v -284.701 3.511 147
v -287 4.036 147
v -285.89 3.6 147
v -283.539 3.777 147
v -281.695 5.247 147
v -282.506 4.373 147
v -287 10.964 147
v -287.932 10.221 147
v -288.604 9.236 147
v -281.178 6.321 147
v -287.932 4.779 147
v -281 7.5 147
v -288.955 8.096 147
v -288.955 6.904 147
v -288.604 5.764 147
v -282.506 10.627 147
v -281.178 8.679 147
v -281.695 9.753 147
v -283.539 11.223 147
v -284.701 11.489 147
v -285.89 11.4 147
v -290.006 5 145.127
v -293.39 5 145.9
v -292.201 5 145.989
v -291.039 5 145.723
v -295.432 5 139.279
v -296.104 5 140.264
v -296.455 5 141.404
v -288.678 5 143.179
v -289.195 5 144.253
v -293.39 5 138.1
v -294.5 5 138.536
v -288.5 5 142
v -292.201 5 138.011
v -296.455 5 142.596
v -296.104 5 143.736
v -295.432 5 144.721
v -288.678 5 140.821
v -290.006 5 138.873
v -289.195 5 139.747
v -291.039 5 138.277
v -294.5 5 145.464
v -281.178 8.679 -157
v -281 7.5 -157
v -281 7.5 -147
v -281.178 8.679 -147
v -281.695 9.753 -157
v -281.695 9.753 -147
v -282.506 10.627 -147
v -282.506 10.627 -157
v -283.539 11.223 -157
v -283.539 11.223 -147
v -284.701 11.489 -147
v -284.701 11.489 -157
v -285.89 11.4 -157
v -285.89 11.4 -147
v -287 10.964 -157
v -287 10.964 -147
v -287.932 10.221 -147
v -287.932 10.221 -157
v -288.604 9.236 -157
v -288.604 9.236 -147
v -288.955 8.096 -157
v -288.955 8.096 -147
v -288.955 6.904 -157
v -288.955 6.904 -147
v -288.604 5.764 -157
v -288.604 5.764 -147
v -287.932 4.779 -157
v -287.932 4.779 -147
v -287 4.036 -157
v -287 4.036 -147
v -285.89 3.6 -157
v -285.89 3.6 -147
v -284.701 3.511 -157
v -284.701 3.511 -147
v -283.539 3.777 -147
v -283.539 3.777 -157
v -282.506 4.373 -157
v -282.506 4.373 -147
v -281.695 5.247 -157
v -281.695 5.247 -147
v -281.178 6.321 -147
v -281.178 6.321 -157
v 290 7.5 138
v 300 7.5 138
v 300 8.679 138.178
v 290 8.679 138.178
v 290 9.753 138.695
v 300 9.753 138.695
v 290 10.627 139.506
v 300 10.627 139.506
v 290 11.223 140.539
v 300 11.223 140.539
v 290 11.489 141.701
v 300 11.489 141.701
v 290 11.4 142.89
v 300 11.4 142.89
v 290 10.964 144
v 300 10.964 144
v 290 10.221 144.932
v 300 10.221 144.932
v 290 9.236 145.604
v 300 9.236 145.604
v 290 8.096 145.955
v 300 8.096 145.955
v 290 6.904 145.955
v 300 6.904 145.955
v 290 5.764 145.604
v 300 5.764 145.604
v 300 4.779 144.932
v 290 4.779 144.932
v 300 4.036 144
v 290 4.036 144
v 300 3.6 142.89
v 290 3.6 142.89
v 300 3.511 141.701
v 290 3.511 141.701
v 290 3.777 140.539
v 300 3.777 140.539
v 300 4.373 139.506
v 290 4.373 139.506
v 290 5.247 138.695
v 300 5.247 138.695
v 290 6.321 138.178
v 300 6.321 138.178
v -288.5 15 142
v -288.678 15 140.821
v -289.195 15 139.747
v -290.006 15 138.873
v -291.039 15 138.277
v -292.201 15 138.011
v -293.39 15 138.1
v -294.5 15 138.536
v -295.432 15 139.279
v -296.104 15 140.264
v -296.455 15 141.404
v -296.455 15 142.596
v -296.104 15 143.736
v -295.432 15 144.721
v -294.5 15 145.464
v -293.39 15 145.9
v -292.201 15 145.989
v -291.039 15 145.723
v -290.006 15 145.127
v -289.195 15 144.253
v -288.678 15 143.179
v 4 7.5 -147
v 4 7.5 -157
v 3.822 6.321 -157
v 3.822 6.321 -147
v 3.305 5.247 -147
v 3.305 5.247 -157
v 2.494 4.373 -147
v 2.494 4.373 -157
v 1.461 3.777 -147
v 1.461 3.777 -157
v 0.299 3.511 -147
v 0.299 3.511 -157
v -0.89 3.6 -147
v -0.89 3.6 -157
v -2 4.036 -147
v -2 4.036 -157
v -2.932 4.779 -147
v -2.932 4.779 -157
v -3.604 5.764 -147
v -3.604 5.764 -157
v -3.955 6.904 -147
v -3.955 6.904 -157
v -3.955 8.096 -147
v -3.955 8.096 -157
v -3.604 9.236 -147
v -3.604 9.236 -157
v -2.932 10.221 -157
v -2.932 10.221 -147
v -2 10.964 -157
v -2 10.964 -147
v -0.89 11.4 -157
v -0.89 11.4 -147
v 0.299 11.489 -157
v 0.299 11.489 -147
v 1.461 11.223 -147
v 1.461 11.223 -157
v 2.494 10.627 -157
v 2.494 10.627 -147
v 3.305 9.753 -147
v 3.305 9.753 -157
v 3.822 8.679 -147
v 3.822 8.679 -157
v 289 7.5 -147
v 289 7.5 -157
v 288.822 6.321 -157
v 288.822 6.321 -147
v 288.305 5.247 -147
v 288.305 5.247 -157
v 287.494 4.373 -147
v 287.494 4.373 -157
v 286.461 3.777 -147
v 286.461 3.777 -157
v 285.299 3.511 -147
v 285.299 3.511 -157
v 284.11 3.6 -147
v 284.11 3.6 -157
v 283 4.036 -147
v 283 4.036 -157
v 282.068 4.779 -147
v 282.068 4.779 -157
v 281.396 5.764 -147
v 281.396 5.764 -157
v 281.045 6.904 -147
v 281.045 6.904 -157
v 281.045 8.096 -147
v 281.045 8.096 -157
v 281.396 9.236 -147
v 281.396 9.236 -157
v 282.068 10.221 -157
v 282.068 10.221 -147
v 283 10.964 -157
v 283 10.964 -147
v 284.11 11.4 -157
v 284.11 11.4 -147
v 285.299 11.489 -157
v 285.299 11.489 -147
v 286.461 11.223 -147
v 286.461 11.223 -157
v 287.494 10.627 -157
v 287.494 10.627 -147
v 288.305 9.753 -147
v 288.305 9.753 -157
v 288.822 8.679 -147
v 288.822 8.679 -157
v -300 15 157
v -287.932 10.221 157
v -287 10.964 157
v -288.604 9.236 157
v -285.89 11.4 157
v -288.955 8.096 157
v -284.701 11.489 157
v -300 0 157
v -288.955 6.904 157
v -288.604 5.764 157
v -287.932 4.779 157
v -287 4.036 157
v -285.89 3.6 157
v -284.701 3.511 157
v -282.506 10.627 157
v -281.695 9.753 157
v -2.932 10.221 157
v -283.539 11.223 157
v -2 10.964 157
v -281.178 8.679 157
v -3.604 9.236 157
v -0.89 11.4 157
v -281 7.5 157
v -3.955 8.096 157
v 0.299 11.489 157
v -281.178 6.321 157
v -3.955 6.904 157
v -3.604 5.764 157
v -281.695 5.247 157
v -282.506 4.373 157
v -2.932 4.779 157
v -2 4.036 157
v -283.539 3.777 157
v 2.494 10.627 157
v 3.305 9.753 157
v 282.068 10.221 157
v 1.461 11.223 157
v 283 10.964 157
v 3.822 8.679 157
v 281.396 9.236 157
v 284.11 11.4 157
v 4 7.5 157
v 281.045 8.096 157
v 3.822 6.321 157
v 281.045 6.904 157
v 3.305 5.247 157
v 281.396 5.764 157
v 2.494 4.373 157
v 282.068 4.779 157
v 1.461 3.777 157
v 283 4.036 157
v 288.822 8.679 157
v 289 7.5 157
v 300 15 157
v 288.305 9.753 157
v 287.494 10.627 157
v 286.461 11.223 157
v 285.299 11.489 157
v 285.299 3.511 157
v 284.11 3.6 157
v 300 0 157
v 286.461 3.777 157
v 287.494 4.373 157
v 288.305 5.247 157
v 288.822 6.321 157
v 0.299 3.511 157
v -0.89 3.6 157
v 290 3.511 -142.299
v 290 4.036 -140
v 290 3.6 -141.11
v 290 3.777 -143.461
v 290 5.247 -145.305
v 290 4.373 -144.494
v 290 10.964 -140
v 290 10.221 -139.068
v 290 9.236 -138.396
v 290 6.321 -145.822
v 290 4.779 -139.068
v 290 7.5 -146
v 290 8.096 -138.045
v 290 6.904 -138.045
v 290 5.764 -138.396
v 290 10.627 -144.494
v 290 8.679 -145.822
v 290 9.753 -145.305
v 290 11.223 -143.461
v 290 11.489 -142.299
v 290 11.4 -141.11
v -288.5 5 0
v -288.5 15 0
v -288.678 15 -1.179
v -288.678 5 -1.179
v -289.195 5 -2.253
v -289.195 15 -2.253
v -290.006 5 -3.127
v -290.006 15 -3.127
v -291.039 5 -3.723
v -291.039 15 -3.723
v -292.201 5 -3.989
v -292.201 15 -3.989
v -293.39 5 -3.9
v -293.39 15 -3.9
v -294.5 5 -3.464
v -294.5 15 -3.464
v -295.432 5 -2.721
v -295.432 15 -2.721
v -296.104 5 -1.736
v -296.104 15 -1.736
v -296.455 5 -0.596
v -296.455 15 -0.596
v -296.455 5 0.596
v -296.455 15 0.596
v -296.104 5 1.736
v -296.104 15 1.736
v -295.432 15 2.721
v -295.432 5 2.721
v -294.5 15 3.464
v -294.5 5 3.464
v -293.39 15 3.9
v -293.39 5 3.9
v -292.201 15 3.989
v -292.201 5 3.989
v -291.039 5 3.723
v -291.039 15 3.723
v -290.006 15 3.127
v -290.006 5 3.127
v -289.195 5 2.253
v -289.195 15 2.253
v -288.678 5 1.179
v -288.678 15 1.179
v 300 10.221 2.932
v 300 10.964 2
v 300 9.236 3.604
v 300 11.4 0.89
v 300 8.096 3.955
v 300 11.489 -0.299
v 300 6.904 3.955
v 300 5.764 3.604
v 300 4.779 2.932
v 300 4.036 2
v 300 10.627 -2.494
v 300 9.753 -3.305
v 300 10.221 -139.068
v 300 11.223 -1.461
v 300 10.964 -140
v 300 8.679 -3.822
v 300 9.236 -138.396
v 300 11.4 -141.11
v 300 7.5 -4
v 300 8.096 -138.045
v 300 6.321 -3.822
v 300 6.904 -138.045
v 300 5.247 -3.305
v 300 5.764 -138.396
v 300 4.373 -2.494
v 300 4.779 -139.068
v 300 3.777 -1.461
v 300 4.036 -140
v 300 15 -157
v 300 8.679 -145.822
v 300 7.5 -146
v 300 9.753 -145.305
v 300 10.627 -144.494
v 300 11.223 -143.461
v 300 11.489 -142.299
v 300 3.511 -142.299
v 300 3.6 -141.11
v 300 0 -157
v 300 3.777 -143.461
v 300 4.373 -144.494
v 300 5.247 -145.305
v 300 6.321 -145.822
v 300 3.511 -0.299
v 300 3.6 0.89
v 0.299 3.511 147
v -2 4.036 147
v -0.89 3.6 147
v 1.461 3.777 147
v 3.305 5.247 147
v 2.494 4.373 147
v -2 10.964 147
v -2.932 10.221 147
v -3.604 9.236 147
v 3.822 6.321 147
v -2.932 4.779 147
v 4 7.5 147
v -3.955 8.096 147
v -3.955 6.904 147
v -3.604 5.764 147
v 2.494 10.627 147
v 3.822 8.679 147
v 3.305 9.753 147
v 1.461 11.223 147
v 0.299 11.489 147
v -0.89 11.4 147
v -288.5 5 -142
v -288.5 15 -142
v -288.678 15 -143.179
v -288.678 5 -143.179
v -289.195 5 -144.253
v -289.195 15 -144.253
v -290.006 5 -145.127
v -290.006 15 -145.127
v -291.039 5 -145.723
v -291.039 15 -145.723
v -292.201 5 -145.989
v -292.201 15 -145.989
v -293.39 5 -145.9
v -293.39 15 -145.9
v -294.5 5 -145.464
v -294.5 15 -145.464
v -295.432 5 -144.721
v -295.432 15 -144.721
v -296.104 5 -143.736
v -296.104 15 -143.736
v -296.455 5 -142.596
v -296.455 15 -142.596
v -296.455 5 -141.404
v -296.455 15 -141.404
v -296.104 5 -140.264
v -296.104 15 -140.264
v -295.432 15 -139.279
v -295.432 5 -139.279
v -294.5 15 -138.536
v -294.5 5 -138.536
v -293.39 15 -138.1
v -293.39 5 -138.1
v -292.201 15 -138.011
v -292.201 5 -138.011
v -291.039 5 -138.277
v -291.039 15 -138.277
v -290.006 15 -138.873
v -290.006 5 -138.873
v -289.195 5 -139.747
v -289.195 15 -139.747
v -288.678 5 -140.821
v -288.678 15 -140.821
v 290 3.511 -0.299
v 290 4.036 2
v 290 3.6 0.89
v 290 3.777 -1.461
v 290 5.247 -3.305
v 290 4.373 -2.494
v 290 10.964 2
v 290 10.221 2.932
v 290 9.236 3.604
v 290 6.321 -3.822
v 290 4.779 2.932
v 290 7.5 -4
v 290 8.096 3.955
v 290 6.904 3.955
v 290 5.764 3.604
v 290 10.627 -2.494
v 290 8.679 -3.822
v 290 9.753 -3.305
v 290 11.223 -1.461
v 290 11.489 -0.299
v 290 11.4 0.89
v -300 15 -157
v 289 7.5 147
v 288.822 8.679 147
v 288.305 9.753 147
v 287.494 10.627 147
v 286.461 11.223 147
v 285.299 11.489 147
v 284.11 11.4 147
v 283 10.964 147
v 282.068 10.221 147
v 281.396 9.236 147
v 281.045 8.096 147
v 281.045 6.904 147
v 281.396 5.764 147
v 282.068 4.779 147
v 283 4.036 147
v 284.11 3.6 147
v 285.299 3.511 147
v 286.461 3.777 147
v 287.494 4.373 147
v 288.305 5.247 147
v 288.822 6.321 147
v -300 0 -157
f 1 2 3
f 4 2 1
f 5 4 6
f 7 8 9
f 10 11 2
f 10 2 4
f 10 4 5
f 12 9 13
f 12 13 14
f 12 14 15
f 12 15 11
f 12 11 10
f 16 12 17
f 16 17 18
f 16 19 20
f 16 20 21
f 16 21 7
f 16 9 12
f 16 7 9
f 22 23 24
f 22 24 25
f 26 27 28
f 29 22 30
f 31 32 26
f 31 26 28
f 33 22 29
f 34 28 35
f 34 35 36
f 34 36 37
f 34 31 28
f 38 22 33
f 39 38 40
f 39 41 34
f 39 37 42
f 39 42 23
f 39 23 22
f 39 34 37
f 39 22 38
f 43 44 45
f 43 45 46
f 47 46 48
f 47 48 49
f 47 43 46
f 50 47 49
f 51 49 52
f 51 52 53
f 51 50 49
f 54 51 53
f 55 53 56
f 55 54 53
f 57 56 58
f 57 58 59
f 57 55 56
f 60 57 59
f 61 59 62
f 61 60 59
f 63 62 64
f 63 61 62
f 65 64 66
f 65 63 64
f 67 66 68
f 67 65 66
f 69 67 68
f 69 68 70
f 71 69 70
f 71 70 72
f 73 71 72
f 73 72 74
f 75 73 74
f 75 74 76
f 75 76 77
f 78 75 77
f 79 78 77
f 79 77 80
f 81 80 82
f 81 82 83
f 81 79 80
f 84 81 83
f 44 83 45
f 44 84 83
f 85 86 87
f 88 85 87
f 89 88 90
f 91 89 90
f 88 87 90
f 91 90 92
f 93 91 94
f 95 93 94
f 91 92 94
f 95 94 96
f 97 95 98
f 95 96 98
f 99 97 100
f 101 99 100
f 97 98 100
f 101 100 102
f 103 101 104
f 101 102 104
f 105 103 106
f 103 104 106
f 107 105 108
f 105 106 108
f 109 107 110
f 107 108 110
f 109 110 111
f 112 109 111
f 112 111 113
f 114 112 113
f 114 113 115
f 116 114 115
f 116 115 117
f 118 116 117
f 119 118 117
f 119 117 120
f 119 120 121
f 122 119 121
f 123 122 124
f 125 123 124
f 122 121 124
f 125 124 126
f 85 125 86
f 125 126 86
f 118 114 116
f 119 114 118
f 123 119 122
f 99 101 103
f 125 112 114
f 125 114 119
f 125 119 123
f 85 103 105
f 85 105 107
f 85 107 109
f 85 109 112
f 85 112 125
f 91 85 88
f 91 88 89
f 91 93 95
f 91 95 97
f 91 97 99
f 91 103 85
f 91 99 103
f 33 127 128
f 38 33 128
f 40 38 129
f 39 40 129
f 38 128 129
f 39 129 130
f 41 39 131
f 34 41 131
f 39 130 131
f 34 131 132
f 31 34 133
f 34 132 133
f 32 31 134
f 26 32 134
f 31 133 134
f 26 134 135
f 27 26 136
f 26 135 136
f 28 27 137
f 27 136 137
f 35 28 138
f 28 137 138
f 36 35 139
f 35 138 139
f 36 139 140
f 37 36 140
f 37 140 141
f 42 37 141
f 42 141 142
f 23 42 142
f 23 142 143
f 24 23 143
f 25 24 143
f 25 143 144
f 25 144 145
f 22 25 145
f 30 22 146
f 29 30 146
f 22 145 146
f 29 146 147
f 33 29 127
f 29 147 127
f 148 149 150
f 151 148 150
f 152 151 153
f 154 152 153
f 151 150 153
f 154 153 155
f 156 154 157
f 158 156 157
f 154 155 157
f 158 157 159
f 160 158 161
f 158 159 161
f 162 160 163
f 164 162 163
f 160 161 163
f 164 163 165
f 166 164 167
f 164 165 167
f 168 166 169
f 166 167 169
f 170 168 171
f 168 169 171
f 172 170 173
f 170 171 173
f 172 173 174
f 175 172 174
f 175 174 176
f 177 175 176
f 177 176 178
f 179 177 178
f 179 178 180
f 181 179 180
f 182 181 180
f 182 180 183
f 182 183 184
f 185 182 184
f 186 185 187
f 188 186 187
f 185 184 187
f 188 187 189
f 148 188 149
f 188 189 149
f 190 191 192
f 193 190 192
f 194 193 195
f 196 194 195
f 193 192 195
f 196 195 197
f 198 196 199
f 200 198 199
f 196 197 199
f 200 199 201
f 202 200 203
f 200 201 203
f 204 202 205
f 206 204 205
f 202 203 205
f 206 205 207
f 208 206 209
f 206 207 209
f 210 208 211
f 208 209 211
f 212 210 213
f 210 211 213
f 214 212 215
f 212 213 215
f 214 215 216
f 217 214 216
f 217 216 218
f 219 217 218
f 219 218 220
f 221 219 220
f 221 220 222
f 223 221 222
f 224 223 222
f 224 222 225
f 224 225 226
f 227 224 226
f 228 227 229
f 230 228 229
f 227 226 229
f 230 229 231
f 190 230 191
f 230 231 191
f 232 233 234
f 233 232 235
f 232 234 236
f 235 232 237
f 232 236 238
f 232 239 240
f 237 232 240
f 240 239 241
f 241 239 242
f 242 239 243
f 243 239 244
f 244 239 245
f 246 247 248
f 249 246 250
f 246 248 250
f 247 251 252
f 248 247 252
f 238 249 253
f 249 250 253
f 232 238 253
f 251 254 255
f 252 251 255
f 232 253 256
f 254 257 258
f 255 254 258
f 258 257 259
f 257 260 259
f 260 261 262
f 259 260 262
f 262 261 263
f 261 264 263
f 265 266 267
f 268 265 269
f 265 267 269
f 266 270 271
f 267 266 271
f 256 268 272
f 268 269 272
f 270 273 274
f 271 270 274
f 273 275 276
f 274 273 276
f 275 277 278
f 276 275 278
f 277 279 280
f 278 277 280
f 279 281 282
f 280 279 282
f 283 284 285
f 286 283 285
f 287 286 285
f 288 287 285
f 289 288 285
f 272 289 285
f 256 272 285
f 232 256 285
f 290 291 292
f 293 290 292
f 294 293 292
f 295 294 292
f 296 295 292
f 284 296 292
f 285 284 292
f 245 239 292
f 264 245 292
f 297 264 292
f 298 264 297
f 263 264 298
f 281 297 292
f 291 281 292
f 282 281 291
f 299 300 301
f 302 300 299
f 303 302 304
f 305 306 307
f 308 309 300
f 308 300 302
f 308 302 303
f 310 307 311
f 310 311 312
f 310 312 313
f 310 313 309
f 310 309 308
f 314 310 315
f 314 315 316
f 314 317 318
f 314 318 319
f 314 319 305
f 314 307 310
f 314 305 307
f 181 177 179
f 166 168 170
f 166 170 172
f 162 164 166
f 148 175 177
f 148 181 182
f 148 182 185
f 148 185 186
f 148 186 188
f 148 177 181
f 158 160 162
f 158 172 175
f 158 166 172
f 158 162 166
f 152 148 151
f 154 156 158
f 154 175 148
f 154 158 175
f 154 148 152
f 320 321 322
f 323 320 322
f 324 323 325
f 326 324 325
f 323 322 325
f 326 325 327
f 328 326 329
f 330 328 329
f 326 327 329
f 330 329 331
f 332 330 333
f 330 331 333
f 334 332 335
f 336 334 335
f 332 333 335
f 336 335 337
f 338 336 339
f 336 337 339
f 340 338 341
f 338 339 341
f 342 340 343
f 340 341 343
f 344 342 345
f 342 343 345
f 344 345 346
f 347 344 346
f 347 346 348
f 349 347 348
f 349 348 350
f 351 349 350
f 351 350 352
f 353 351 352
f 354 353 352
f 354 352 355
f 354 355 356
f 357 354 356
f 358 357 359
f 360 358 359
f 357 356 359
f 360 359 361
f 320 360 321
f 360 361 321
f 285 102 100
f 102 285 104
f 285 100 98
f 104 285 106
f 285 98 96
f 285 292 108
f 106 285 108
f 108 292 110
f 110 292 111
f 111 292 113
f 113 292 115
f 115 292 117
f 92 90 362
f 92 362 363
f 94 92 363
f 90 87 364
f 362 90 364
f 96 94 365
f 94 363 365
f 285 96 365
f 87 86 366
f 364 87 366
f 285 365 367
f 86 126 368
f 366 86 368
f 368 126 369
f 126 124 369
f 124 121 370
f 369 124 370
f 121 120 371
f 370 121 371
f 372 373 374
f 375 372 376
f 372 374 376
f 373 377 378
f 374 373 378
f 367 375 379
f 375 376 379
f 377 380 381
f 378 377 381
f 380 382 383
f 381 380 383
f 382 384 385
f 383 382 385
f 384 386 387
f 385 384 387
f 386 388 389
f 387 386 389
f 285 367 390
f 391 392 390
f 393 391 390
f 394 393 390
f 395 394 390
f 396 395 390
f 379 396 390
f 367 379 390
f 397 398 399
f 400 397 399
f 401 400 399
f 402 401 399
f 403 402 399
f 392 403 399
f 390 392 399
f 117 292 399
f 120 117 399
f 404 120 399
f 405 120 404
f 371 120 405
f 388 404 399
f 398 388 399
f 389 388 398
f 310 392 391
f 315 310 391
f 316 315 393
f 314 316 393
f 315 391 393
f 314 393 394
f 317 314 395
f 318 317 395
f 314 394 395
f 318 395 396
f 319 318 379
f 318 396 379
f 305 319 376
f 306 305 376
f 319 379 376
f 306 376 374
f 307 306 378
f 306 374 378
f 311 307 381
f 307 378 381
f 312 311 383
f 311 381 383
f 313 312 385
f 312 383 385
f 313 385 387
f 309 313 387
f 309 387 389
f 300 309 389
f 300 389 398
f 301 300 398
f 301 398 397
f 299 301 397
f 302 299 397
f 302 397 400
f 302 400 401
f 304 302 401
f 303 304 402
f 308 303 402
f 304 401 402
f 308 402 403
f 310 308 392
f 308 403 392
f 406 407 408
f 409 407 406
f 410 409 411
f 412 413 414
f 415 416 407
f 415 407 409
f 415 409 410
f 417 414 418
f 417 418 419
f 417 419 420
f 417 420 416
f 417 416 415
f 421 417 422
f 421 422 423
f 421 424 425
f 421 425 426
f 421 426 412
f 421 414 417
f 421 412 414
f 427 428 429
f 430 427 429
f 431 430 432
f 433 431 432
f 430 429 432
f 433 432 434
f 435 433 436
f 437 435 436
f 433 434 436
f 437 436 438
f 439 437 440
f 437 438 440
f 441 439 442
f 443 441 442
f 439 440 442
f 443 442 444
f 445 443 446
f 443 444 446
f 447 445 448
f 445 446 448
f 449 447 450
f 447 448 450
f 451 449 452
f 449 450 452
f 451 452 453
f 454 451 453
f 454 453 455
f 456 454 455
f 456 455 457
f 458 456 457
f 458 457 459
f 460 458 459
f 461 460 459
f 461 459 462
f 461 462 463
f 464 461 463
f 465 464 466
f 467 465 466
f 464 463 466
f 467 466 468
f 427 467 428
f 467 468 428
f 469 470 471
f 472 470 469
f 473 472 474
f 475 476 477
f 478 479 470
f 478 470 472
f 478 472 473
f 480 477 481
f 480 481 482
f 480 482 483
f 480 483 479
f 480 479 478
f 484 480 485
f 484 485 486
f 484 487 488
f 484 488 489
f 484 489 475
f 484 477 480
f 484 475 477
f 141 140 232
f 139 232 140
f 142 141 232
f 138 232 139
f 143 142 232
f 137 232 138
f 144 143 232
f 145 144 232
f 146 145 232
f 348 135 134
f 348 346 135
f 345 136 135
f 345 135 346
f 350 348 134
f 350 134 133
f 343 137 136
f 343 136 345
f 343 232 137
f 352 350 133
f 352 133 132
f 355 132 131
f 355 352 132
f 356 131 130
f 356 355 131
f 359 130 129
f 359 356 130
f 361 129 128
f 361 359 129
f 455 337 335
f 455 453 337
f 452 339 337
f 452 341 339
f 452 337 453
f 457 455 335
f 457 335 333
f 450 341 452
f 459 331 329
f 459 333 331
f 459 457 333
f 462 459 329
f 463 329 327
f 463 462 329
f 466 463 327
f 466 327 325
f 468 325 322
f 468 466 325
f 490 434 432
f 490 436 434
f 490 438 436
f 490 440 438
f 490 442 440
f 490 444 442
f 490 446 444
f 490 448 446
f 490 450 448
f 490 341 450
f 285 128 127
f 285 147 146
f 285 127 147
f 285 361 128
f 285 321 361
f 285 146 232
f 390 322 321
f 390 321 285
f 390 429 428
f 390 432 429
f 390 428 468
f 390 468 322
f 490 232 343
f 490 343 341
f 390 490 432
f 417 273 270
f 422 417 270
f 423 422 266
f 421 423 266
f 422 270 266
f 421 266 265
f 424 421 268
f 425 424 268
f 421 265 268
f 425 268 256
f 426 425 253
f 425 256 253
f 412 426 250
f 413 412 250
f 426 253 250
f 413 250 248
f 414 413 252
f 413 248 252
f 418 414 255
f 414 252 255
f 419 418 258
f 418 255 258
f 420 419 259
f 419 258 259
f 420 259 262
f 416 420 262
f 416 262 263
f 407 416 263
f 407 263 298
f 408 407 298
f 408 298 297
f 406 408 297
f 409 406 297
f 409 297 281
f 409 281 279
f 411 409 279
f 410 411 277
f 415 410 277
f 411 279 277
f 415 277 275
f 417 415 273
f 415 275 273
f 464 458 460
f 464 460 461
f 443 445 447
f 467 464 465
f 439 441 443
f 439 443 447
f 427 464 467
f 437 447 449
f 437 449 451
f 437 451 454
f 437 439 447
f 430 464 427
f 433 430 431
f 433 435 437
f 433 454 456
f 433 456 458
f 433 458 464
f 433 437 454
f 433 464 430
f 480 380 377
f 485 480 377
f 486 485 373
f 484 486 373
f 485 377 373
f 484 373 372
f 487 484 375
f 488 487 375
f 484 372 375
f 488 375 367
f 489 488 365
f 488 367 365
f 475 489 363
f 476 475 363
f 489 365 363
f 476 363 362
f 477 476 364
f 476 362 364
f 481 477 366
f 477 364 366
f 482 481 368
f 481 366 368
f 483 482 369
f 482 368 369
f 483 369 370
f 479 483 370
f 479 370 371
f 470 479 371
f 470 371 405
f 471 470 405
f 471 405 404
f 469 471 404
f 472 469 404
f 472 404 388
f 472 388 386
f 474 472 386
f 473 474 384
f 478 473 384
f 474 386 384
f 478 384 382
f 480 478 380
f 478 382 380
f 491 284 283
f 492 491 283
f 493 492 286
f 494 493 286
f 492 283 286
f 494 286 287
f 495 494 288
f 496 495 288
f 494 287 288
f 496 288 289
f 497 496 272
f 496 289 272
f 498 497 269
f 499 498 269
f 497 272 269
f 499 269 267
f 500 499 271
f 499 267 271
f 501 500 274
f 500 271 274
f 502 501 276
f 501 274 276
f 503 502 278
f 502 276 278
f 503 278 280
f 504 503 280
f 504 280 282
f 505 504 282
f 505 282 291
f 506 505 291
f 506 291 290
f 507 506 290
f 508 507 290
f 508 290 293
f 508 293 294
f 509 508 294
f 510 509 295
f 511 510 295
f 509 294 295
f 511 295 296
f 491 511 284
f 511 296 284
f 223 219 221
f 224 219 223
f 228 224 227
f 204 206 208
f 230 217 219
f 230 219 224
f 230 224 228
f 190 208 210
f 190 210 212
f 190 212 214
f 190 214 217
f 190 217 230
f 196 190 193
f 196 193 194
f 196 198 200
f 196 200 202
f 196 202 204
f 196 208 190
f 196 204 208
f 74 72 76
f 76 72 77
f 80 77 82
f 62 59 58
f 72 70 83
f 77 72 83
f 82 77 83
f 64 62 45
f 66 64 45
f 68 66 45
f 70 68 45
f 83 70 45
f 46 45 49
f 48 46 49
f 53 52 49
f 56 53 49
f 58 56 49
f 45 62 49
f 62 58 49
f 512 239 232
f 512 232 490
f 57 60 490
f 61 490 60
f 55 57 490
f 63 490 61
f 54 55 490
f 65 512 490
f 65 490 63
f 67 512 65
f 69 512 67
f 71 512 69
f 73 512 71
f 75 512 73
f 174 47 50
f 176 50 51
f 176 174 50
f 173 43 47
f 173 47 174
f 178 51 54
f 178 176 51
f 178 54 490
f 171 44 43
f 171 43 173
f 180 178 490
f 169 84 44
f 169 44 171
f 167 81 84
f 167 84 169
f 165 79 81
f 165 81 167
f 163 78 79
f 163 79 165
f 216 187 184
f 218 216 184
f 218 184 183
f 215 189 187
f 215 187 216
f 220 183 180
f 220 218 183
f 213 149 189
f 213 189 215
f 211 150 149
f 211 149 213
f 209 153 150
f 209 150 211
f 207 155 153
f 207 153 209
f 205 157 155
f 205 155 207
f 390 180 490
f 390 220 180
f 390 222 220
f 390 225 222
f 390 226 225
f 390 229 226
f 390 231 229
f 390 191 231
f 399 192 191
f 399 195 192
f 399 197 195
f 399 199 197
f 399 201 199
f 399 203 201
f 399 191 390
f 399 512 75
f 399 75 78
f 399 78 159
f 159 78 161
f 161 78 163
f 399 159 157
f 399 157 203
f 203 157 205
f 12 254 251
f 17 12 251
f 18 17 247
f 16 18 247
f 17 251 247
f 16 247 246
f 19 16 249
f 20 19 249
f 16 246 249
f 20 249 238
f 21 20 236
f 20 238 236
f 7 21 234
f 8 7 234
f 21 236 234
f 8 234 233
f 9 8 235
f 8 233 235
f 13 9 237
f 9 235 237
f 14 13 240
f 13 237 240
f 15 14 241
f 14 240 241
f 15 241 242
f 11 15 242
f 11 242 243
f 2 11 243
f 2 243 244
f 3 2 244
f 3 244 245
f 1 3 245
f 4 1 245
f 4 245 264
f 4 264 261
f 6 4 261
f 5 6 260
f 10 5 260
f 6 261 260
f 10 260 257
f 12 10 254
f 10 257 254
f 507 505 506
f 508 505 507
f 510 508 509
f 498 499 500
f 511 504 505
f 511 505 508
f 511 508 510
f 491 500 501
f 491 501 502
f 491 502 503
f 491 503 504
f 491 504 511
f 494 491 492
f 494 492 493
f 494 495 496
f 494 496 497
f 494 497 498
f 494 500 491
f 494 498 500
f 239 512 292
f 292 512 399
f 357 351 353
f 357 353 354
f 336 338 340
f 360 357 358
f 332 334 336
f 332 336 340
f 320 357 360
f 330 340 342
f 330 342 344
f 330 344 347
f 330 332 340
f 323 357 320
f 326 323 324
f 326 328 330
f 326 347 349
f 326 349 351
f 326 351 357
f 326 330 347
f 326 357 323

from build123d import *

# Parameters (mm, degrees)
SKETCH1_W               = 600
SKETCH1_H               = 314
BOSS_EXTRUDE1_DEPTH     = 15
SKETCH2_R               = 4
CUT_EXTRUDE1_DEPTH      = 10
LPATTERN1_COUNT         = 3
LPATTERN1_PITCH         = 142
SKETCH3_R               = 4
CUT_EXTRUDE2_DEPTH      = 10
LPATTERN2_COUNT         = 3
LPATTERN2_PITCH         = 285
SKETCH4_R               = 4
CUT_EXTRUDE3_DEPTH      = 10
LPATTERN3_COUNT         = 3
LPATTERN3_PITCH         = 142
MIRROR1_COPY_1_SKETCH_R = 4
MIRROR1_COPY_1_DEPTH    = 10
MIRROR1_COPY_2_SKETCH_R = 4
MIRROR1_COPY_2_DEPTH    = 10


with BuildPart() as part:
    # Sketch1 → Boss-Extrude1 (new body)
    with BuildSketch(Plane(origin=(0, 0, 0), x_dir=(1, 0, 0), z_dir=(0, 1, 0))):
        Rectangle(SKETCH1_W, SKETCH1_H)
    extrude(amount=BOSS_EXTRUDE1_DEPTH)

    # Sketch2 → Cut-Extrude1 (cut)
    with BuildSketch(Plane(origin=(0, 15, 0), x_dir=(1, 0, 0), z_dir=(0, 1, 0))):
        with Locations((-292.5, 142)):
            Circle(SKETCH2_R)
    cut_extrude1 = extrude(amount=-CUT_EXTRUDE1_DEPTH, mode=Mode.SUBTRACT)

    # LPattern1: Cut-Extrude1 ×3
    with Locations(*[(0, 0, i * LPATTERN1_PITCH) for i in range(1, LPATTERN1_COUNT)]):
        add(cut_extrude1, mode=Mode.SUBTRACT)

    # Sketch3 → Cut-Extrude2 (cut)
    with BuildSketch(Plane.XY.offset(157)):
        with Locations((-285, 7.5)):
            Circle(SKETCH3_R)
    cut_extrude2 = extrude(amount=-CUT_EXTRUDE2_DEPTH, mode=Mode.SUBTRACT)

    # LPattern2: Cut-Extrude2 ×3
    with Locations(*[(i * LPATTERN2_PITCH, 0, 0) for i in range(1, LPATTERN2_COUNT)]):
        add(cut_extrude2, mode=Mode.SUBTRACT)

    # Sketch4 → Cut-Extrude3 (cut)
    with BuildSketch(Plane(origin=(300, 0, 0), x_dir=(0, 0, -1), z_dir=(1, 0, 0))):
        with Locations((-142, 7.5)):
            Circle(SKETCH4_R)
    cut_extrude3 = extrude(amount=-CUT_EXTRUDE3_DEPTH, mode=Mode.SUBTRACT)

    # LPattern3: Cut-Extrude3 ×3
    with Locations(*[(0, 0, -i * LPATTERN3_PITCH) for i in range(1, LPATTERN3_COUNT)]):
        add(cut_extrude3, mode=Mode.SUBTRACT)

    # Mirror1: Cut-Extrude2 across plane
    add(cut_extrude2.mirror(Plane.XY), mode=Mode.SUBTRACT)

    # Mirror1 copy 1 sketch → Mirror1 copy 1 (cut)
    with BuildSketch(Plane(origin=(285, 0, -157), x_dir=(1, 0, 0), z_dir=(0, 0, -1))):
        with Locations((-285, -7.5)):
            Circle(MIRROR1_COPY_1_SKETCH_R)
    extrude(amount=-MIRROR1_COPY_1_DEPTH, mode=Mode.SUBTRACT)

    # Mirror1 copy 2 sketch → Mirror1 copy 2 (cut)
    with BuildSketch(Plane(origin=(570, 0, -157), x_dir=(1, 0, 0), z_dir=(0, 0, -1))):
        with Locations((-285, -7.5)):
            Circle(MIRROR1_COPY_2_SKETCH_R)
    extrude(amount=-MIRROR1_COPY_2_DEPTH, mode=Mode.SUBTRACT)


solid = part.part
